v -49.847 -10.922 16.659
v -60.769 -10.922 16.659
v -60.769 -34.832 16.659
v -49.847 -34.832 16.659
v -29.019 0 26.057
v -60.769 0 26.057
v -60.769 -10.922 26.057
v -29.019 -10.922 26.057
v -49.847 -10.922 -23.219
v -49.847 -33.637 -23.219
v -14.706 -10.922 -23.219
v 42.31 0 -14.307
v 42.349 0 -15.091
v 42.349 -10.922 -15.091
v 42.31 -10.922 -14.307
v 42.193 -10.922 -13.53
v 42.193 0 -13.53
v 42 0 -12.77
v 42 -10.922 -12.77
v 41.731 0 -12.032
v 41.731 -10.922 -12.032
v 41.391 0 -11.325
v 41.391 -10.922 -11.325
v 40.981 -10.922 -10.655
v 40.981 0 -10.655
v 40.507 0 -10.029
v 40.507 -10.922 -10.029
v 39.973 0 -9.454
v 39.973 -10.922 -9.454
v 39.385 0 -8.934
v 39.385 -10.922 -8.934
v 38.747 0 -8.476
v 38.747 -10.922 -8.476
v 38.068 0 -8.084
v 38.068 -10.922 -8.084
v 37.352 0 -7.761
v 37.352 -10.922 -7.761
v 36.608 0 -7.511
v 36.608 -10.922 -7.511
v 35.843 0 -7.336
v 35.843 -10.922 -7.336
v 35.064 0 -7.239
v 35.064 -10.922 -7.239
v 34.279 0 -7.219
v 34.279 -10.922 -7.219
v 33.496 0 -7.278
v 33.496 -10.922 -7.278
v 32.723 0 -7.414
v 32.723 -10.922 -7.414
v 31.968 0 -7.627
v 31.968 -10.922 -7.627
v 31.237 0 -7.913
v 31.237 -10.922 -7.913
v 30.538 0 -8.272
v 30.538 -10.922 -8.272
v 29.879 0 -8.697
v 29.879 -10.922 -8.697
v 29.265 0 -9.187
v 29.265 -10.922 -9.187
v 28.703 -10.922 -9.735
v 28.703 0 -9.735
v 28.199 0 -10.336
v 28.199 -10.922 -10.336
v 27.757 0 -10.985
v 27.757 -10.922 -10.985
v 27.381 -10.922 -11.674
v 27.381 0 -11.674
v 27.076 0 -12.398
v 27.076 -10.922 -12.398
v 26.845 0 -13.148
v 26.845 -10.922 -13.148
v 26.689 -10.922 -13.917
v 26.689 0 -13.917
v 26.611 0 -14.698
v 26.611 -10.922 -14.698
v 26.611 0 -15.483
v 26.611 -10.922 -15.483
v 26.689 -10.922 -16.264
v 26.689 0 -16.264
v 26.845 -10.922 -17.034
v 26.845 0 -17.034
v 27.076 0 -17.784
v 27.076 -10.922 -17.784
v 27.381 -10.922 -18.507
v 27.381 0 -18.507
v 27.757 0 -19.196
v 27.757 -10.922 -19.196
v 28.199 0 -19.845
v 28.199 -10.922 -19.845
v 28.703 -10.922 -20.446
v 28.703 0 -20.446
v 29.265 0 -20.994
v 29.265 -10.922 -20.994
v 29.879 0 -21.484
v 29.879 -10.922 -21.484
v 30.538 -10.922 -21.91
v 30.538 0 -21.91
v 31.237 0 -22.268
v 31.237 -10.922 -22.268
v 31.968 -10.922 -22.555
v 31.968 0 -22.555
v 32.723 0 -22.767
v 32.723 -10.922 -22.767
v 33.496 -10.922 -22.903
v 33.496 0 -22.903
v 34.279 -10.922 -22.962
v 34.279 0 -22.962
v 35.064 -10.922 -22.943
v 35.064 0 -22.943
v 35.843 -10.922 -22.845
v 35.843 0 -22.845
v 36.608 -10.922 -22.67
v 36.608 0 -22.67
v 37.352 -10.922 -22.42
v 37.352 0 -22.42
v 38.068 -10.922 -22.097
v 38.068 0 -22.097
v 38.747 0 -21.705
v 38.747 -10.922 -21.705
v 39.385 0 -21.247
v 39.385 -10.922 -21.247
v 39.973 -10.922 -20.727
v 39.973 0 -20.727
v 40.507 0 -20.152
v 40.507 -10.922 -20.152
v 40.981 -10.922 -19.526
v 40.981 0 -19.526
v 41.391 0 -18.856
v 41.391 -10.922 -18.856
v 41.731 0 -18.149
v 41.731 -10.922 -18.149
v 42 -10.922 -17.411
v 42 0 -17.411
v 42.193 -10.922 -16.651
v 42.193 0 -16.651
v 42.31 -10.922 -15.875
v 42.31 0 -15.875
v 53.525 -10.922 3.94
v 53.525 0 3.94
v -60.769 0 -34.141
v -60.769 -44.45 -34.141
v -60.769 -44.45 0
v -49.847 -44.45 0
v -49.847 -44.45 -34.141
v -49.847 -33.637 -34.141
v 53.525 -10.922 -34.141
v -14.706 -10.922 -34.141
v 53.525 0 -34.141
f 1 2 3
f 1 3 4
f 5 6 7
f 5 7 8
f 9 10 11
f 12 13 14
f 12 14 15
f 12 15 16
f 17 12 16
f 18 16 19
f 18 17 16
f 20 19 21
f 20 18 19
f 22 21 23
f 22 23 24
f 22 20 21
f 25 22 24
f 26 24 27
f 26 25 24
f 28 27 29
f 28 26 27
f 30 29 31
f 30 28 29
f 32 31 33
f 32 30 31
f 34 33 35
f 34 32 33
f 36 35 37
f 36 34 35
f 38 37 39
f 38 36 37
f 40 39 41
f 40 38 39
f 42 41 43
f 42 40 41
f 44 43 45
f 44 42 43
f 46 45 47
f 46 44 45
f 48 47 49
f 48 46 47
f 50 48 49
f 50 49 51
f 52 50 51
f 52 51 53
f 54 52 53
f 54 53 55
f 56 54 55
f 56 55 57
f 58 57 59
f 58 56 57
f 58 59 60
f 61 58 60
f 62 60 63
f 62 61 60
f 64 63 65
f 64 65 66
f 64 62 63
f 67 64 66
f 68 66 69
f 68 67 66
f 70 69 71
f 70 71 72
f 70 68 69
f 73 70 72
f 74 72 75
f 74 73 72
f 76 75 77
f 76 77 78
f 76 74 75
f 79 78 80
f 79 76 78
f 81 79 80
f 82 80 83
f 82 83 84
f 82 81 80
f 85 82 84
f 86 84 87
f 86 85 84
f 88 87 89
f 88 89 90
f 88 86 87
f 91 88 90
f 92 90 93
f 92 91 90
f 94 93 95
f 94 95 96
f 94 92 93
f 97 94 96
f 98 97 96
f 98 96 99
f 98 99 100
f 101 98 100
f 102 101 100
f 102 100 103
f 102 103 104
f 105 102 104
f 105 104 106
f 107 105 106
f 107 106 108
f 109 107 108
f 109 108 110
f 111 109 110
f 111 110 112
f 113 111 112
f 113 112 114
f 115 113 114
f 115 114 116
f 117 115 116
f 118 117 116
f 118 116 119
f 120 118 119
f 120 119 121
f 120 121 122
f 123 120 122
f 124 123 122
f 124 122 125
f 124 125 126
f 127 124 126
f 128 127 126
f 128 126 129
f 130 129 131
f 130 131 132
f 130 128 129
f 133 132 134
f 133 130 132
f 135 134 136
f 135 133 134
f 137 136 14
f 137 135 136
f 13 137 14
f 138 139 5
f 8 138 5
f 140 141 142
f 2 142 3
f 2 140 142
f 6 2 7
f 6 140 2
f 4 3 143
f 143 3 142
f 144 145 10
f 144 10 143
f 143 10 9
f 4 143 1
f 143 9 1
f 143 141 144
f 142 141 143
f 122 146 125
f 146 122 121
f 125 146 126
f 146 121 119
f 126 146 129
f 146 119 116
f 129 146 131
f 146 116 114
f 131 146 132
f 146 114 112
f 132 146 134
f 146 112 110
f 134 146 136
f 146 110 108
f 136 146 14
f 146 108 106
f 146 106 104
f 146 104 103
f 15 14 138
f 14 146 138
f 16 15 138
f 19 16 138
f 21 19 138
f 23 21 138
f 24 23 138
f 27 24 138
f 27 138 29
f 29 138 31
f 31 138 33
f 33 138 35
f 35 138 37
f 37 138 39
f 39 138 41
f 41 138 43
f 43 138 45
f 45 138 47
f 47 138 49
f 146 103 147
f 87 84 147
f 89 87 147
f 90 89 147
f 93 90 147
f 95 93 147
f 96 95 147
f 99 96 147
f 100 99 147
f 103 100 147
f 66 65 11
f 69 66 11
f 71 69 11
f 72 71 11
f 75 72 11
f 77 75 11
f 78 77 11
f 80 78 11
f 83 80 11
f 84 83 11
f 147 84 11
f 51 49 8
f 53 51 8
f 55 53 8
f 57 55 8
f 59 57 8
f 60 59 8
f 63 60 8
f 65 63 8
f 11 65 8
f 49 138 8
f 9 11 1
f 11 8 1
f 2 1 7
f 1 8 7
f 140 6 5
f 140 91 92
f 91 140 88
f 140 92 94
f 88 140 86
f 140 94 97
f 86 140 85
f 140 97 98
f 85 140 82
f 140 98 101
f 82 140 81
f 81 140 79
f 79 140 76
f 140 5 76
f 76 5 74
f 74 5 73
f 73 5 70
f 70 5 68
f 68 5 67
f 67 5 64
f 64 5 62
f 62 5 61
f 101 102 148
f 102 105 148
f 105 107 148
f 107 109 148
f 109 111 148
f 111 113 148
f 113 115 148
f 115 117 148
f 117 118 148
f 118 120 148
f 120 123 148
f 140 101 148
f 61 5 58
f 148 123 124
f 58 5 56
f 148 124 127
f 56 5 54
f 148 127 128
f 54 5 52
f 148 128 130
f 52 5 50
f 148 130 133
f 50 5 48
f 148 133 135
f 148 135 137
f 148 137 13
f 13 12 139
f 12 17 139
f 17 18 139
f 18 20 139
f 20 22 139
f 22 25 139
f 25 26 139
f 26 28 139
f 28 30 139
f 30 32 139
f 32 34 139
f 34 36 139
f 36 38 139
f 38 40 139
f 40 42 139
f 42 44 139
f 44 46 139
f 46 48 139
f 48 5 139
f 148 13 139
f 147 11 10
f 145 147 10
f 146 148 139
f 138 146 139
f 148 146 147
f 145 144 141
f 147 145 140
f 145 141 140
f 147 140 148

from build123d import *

# Parameters (mm, degrees)
F0_W      = 31.75
F0_H      = 60.198
F0_R      = 7.874
F1_DEPTH  = 10.922
F2_DEPTH  = 10.922
F3_W      = 10.922
F3_H      = 50.8
F4_DEPTH  = 33.528
F6_DEPTH  = 10.922
F7_W      = 33.528
F7_H      = 10.922
F8_DEPTH  = 52.578
F10_DEPTH = 10.922


with BuildPart() as f1:
    # F0 (on Front) → F1 (new body)
    with BuildSketch(Plane.XZ):
        with Locations((-44.894285, -4.041589)):
            Rectangle(F0_W, F0_H)
        Polygon((-29.019285, 26.057411), (-29.019285, -34.140589), (53.525416, -34.140589), (53.525416, 3.939625), align=None)
        with Locations((34.475416, -15.090589)):
            Circle(F0_R, mode=Mode.SUBTRACT)
    extrude(amount=F1_DEPTH)

    # F0 (on Front) → F2 (cut)
    with BuildSketch(Plane.XZ):
        with Locations((-44.894285, -4.041589)):
            Rectangle(F0_W, F0_H)
        Polygon((-29.019285, 26.057411), (-29.019285, -34.140589), (53.525416, -34.140589), (53.525416, 3.939625), align=None)
        with Locations((34.475416, -15.090589)):
            Circle(F0_R, mode=Mode.SUBTRACT)
    extrude(amount=-F2_DEPTH, mode=Mode.SUBTRACT)

    # F3 (on face) → F4 (join)
    with BuildSketch(Plane.XZ.offset(10.922)):
        with Locations((-55.308285, -8.740589)):
            Rectangle(F3_W, F3_H)
    extrude(amount=F4_DEPTH)

    # F5 (on face) → F6 (cut)
    with BuildSketch(Plane(origin=(-60.769285, 0, 0), x_dir=(0, -1, 0), z_dir=(-1, 0, 0))):
        Polygon((34.831685, 16.659411), (44.45, 0), (44.45, 16.659411), align=None)
    extrude(amount=-F6_DEPTH, mode=Mode.SUBTRACT)

    # F7 (on face) → F8 (join)
    with BuildSketch(Plane.YZ.offset(-49.847285)):
        with Locations((-27.686, -28.679589)):
            Rectangle(F7_W, F7_H)
    extrude(amount=F8_DEPTH)

    # F9 (on face) → F10 (cut)
    with BuildSketch(Plane.XY.offset(-23.218589)):
        Polygon((-14.706187, -10.922), (-49.847285, -33.637185), (-49.847285, -44.45), (2.730715, -44.45), (2.730715, -10.922), align=None)
    extrude(amount=-F10_DEPTH, mode=Mode.SUBTRACT)


solid = f1.part
